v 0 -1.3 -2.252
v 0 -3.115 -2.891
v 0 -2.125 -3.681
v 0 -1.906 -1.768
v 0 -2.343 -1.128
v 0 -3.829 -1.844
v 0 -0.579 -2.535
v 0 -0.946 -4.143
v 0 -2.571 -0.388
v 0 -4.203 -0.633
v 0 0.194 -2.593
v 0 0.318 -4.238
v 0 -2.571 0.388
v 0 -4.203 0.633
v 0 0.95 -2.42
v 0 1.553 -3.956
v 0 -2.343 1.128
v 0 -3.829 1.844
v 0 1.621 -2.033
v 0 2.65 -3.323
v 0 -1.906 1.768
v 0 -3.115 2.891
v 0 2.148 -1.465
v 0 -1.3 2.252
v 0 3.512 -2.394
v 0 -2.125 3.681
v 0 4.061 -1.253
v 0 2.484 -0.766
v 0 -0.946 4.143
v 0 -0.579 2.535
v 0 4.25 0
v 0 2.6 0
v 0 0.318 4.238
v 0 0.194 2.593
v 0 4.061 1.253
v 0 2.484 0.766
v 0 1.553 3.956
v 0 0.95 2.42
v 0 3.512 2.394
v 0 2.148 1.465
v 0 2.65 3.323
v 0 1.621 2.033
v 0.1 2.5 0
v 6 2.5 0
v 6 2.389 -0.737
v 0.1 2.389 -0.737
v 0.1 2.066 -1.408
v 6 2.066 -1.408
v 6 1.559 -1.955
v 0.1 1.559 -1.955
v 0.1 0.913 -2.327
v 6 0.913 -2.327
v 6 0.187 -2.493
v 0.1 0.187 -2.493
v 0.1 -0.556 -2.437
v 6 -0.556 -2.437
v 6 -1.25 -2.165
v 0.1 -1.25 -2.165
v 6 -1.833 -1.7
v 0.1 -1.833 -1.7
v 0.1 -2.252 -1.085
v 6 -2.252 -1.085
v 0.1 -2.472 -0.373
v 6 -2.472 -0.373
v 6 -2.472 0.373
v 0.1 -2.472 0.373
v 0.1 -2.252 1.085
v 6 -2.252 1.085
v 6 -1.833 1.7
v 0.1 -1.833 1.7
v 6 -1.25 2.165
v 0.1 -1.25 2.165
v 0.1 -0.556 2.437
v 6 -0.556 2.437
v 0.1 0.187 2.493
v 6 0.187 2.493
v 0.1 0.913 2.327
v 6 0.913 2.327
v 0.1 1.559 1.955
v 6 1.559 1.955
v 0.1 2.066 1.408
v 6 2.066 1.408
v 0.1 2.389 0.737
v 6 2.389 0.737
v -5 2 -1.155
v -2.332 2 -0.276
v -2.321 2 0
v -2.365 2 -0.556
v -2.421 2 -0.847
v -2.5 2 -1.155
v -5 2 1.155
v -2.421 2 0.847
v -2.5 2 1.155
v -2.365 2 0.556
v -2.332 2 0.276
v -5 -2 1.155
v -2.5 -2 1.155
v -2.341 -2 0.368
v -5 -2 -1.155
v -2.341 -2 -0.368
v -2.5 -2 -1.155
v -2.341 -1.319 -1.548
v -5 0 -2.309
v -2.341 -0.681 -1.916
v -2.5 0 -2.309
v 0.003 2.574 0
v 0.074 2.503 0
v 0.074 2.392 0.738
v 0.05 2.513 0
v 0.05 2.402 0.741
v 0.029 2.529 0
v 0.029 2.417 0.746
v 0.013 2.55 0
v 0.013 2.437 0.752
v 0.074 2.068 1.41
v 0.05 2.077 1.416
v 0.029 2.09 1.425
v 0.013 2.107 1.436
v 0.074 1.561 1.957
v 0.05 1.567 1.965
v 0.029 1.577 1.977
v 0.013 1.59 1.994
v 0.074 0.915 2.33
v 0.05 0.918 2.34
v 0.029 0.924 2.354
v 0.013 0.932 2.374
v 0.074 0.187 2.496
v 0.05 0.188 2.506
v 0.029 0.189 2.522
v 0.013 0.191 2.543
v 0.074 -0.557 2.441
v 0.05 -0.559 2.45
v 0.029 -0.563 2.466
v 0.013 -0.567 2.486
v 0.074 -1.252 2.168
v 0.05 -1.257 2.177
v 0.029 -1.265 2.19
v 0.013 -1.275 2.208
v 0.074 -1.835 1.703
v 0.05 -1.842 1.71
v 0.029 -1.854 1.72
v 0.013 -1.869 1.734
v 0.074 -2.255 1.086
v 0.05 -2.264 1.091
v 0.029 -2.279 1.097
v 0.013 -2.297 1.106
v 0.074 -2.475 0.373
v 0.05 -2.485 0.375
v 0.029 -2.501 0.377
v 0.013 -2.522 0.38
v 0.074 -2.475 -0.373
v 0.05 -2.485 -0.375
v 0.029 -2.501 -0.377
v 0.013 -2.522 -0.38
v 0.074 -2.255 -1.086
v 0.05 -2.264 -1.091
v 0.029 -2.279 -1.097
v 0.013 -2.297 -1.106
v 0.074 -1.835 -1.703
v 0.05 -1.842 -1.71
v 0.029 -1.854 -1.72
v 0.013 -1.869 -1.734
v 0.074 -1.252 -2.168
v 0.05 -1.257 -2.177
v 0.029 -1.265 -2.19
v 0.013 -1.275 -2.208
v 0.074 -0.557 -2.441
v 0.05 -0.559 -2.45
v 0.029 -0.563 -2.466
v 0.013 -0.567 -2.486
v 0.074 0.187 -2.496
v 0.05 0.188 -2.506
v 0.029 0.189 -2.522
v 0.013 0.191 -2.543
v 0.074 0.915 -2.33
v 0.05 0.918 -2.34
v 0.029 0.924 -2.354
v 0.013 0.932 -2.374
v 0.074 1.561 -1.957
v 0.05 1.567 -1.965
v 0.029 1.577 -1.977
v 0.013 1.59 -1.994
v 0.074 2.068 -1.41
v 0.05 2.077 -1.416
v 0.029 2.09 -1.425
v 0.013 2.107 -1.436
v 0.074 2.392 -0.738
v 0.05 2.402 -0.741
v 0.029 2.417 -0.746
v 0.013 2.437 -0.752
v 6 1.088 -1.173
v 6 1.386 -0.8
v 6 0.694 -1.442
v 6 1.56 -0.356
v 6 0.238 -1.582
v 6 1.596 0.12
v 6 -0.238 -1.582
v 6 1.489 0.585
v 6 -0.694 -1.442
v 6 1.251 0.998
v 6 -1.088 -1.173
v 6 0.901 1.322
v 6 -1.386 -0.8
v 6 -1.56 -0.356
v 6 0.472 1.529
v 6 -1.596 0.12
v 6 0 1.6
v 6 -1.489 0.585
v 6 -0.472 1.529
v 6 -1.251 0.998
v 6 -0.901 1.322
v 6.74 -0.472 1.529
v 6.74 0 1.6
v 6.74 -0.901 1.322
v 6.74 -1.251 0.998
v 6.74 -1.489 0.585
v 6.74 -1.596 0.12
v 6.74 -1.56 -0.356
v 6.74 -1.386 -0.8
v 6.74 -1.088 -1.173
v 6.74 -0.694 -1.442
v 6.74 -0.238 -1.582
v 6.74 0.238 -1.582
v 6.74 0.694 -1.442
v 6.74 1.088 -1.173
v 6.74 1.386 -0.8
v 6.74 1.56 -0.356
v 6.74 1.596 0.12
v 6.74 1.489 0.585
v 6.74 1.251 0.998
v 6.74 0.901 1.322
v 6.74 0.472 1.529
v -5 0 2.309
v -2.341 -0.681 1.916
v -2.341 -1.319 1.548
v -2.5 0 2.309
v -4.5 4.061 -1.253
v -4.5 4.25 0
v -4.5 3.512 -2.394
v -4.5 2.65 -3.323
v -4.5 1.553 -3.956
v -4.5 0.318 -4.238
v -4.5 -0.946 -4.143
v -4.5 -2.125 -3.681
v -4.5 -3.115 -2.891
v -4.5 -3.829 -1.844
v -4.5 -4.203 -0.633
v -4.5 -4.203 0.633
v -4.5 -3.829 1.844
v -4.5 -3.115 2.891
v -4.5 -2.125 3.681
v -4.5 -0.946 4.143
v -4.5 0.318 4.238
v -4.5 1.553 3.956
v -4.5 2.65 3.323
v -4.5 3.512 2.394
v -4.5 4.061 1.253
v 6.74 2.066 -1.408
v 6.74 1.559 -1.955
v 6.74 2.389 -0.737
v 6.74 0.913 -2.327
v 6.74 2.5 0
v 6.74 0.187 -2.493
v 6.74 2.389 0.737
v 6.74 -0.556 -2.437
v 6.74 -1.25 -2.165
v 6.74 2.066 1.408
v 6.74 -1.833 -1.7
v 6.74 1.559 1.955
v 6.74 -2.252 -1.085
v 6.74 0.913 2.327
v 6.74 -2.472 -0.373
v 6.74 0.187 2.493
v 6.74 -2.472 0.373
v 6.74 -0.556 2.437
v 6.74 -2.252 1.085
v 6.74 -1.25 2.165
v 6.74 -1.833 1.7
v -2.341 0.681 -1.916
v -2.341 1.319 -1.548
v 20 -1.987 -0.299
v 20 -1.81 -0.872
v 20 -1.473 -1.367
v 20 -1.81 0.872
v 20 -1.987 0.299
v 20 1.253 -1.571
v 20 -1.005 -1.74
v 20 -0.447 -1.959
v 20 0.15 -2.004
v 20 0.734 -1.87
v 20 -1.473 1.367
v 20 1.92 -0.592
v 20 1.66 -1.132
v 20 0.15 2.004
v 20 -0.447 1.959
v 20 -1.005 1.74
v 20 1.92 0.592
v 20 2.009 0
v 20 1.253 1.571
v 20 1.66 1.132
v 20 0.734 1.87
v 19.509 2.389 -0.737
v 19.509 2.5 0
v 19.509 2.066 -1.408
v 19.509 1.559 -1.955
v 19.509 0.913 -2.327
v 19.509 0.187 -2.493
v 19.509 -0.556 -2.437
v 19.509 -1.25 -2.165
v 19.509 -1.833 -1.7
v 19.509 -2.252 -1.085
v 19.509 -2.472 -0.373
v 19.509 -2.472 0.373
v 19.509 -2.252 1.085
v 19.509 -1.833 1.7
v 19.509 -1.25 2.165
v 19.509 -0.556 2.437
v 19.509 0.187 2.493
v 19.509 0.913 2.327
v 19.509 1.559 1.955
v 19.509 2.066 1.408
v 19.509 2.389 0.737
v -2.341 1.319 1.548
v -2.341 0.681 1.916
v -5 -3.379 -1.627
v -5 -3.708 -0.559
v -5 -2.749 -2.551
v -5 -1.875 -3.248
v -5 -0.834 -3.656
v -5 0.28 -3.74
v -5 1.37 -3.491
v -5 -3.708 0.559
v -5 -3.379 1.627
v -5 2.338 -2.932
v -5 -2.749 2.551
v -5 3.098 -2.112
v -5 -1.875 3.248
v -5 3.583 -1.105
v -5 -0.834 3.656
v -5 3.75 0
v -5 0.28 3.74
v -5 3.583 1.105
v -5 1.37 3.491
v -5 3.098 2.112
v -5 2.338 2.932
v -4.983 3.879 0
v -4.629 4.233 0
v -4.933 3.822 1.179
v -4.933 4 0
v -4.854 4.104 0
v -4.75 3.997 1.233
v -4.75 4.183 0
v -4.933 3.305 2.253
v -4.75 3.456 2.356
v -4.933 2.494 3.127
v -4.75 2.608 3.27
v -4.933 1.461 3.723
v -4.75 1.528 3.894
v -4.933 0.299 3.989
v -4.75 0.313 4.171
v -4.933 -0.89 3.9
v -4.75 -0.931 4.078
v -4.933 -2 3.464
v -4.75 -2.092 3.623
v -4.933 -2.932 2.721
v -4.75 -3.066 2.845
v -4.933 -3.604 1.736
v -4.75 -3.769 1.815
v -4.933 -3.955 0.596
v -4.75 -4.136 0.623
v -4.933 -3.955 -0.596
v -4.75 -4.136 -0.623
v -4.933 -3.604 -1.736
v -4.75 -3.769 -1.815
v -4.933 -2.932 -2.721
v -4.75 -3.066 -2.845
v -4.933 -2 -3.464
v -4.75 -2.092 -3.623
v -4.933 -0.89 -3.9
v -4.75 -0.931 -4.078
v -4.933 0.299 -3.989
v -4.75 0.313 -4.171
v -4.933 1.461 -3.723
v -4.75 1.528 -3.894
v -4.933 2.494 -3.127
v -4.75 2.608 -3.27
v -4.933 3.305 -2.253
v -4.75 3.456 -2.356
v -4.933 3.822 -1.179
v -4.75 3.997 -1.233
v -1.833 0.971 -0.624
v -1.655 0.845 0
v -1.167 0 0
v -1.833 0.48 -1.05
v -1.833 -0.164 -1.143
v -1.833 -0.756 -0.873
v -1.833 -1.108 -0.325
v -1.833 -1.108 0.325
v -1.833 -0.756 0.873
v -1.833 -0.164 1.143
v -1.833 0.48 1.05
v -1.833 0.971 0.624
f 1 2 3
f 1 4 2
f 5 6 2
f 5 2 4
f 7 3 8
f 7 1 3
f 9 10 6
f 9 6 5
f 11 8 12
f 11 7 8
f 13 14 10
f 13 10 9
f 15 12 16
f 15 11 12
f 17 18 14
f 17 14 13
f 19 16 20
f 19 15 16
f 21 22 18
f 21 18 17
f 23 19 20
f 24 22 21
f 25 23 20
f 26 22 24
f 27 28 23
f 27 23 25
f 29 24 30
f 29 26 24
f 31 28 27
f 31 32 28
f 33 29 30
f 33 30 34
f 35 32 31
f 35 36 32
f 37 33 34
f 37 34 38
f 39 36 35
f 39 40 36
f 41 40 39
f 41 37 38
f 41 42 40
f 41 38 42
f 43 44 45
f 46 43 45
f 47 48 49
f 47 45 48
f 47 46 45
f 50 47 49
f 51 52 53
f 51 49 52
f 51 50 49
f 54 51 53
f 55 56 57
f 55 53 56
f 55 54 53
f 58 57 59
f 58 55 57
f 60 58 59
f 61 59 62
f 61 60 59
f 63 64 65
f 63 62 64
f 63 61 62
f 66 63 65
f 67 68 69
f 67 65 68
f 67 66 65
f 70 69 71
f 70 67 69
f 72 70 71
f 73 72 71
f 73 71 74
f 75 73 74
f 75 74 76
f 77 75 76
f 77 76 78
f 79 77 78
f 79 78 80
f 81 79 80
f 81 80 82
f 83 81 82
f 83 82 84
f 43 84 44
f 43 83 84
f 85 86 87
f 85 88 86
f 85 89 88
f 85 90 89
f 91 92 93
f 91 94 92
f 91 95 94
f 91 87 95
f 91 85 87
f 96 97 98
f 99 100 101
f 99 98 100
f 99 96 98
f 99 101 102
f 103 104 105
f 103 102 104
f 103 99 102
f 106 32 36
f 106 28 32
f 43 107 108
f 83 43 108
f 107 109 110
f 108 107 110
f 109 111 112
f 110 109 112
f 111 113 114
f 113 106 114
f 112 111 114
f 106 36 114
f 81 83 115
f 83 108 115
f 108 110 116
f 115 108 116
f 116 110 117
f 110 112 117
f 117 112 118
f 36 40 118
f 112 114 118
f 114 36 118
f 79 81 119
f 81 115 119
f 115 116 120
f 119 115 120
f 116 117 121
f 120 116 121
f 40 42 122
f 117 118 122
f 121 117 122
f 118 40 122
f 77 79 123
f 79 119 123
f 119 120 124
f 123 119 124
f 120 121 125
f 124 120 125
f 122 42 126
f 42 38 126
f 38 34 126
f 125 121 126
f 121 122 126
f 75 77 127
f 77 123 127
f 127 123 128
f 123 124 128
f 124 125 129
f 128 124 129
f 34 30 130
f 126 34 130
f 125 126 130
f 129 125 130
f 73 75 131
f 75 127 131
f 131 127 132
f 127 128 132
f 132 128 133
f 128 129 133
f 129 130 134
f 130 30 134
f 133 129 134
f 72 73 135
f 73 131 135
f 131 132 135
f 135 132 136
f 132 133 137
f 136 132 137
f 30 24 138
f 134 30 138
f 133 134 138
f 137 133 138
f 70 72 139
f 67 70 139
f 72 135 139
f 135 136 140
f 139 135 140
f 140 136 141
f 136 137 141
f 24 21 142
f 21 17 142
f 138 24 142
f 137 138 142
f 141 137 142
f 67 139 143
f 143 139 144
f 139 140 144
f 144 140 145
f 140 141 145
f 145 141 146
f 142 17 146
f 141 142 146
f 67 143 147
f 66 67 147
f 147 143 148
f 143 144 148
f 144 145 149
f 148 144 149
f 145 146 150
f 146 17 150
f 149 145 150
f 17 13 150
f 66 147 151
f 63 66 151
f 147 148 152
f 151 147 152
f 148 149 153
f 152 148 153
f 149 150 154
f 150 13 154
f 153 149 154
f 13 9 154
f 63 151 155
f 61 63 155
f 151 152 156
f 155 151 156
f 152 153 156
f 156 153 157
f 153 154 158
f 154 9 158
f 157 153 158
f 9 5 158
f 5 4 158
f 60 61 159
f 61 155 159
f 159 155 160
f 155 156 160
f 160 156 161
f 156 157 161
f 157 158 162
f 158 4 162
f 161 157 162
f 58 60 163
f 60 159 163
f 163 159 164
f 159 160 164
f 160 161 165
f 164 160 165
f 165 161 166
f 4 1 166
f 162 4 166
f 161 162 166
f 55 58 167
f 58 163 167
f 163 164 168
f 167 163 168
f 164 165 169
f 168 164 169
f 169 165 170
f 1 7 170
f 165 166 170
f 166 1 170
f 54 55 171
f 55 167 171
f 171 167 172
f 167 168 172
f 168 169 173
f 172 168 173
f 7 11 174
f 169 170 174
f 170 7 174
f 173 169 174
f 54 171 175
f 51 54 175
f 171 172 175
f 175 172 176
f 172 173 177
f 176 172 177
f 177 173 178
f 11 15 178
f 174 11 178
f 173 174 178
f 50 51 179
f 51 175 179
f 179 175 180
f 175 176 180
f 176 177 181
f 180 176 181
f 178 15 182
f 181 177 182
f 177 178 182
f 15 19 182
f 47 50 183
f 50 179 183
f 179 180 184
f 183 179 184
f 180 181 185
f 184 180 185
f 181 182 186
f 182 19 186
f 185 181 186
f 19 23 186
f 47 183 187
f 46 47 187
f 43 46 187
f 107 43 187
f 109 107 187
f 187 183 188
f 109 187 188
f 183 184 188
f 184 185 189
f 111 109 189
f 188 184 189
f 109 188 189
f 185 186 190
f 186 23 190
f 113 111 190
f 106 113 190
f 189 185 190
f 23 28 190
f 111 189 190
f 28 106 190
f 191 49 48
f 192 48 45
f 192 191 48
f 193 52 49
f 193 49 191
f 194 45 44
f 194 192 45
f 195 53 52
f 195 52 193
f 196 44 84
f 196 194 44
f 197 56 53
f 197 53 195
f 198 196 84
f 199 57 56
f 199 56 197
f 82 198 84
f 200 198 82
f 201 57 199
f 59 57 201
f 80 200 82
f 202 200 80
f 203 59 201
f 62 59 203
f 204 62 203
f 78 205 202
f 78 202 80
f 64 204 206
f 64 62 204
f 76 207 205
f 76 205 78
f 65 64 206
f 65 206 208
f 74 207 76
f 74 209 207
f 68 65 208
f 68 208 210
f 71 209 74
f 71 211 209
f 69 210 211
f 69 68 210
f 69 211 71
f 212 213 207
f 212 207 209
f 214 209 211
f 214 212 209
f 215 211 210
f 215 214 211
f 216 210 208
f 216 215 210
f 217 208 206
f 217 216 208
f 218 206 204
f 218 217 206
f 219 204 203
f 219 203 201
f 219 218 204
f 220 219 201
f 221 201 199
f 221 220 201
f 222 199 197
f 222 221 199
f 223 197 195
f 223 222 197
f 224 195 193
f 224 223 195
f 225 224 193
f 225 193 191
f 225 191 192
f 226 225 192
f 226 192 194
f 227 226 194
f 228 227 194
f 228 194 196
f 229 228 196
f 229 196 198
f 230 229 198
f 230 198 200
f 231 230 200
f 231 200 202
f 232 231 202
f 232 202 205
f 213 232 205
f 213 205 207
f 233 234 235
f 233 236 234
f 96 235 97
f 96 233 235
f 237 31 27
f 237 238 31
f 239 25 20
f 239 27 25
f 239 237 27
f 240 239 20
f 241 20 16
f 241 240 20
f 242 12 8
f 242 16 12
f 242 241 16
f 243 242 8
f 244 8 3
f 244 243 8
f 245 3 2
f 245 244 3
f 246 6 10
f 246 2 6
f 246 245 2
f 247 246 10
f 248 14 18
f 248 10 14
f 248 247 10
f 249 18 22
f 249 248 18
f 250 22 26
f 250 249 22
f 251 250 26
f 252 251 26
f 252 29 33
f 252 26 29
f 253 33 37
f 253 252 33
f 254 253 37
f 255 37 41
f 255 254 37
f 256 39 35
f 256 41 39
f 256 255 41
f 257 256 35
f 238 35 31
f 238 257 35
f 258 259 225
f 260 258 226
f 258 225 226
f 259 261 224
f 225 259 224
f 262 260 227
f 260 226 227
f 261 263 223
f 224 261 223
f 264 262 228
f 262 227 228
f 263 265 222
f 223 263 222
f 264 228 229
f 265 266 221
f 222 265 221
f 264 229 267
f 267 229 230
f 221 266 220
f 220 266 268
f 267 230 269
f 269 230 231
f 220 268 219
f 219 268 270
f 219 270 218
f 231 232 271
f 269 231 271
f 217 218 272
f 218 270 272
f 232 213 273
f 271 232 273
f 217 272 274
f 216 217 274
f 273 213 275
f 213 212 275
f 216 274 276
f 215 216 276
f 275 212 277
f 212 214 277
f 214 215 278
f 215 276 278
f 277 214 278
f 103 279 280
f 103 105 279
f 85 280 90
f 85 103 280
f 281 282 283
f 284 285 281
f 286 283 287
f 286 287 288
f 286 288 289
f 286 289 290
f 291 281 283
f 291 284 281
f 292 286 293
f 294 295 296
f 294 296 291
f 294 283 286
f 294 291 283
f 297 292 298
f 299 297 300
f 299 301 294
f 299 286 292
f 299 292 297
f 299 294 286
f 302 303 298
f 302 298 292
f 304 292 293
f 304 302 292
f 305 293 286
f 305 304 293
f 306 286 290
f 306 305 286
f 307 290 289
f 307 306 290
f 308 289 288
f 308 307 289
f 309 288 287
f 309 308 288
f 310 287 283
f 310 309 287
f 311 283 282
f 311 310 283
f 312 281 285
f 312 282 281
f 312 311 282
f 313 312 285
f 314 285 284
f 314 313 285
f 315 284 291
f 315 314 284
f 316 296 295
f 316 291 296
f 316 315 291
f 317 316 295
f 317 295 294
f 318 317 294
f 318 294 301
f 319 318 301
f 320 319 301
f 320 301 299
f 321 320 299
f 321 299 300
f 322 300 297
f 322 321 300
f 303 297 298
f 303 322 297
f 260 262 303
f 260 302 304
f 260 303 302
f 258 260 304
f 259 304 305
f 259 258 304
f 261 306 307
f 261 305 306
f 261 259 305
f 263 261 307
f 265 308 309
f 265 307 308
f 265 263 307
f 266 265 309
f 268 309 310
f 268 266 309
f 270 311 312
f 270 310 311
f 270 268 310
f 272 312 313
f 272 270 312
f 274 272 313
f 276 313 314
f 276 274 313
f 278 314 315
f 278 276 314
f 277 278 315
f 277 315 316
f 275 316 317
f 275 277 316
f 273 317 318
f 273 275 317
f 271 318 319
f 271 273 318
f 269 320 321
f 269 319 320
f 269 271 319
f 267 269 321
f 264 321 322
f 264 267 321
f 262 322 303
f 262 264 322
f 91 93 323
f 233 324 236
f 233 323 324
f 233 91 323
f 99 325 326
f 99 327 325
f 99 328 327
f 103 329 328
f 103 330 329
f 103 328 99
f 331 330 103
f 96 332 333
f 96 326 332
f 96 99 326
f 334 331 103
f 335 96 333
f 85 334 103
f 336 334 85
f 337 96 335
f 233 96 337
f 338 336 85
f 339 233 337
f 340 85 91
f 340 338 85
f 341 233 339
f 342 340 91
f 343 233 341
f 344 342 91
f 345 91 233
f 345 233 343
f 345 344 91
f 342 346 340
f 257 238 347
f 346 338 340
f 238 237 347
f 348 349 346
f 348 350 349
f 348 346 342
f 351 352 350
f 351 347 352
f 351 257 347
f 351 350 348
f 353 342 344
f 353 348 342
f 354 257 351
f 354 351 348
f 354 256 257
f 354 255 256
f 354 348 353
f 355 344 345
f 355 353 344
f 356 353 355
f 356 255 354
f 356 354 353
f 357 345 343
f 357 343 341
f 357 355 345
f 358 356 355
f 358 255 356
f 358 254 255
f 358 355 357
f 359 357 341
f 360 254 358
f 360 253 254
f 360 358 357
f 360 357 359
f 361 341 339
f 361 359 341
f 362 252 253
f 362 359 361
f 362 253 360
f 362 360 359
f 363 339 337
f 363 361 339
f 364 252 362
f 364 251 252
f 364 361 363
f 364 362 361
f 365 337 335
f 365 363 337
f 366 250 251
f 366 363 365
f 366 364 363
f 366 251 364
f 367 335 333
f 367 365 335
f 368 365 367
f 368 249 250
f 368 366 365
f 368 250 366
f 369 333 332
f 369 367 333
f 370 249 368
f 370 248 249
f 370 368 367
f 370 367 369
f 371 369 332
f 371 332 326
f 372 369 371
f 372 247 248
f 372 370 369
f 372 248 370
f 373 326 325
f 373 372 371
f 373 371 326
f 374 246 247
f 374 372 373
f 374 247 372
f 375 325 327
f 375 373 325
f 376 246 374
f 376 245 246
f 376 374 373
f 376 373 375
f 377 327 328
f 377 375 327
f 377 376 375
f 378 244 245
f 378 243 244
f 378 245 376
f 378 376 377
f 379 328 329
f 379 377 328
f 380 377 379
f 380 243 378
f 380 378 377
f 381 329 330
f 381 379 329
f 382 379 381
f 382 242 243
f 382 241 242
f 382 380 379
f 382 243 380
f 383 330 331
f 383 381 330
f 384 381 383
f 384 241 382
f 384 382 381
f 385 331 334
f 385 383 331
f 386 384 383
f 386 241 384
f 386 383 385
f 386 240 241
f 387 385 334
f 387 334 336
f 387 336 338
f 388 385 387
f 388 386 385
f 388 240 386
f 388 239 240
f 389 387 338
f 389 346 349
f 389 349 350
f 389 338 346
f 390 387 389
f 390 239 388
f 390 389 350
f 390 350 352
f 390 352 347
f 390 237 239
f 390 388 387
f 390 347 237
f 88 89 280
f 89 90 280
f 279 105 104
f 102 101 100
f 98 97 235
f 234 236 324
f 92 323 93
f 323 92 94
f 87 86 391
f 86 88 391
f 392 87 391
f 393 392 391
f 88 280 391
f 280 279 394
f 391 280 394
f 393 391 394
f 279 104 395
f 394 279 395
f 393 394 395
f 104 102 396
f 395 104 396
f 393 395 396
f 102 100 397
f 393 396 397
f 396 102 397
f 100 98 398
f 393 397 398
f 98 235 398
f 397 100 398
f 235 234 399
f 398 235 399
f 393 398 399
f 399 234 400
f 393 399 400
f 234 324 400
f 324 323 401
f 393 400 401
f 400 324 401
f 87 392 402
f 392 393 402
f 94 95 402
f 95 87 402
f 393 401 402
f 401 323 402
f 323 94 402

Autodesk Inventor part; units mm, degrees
ref_plane "YZ Plane" through (0, 0, 0) normal (1, 0, 0) x (0, 1, 0)
ref_plane "XZ Plane" through (0, 0, 0) normal (0, 1, 0) x (-1, 0, 0)
sketch "Skizze1" plane through (0, 0, 0) normal (0, 0, 1) x (1, 0, 0)
  line L0 (-1.1667, 0) -> (20, 0)
  line L1 (20, 0) -> (20, 2.5)
  line L2 (20, 2.5) -> (2, 2.5)
  line L3 (2, 2.5) -> (1.5091, 2.5)
  line L4 (1.5091, 2.5) -> (0, 2.5)
  line L5 (0, 2.5) -> (0, 4.25)
  line L6 (0, 4.25) -> (-5, 4.25)
  line L7 (-5, 4.25) -> (-5, 2.3094)
  line L8 (-5, 2.3094) -> (-2.5, 2.3094)
  line L9 (-2.5, 2.3094) -> (-1.1667, 0)
  line L10 (-10, 0) -> (25, 0) projected
  line L11 (0, -0.85) -> (0, 5.1) projected
  line L12 (2, 2.5) -> (0, 2.5) construction
  dimension "d1" = 18
  dimension "d2" = 0.4909
  dimension "d3" = 5
  dimension "d4" = 2.5
  dimension "d5" = 60
  dimension "d6" = 5
  dimension "d7" = 5
  dimension "d8" = 4.6188
  dimension "d9" = 8.5
  dimension "d26" = 20
revolve "Körper" add sketch "Skizze1" angle 360 about axis through (-1.1667, 0, 0) along (1, 0, 0)
sketch "Skizze2" plane through (-5, 0, 0) normal (-1, 0, 0) x (0, 0, 1)
  circle A0 centre (0, 0) radius 2.3094 projected
  line L0 (0, -5.95) -> (0, 5.95) projected
  line L1 (-5.95, 0) -> (5.95, 0) projected
  line L2 (2.3094, 0) -> (1.1547, -2)
  line L3 (1.1547, -2) -> (-1.1547, -2)
  line L4 (-1.1547, -2) -> (-2.3094, 0)
  line L5 (-2.3094, 0) -> (-1.1547, 2)
  line L6 (-1.1547, 2) -> (1.1547, 2)
  line L7 (1.1547, 2) -> (2.3094, 0)
extrude "Loch" add sketch "Skizze2" against normal up to next contours L7 A0 | A0 L2 | L6 L0 A0 | A0 L0 L3 | L0 L6 A0 | A0 L3 L0 | L4 A0 | A0 L5
fillet "Rundung1" radius 0.5 1 edges at (-5, -4.25, 0)
thread "Gewinde" size "M5x0.8" class "6g" standard "ISO Metric profile" length 18
chamfer "Fase1" distance 0.4908 distance2 0.4908 1 edges at (20, -2.5, 0) measured on face at (20, -0.7379, -0.3873)
ref_plane "Work Plane1" through (29, 0, 0) normal (0, -1, 0) x (1, 0, 0)
fillet "Fillet2" radius 0.1 1 edges at (0, -2.5, 0)
sketch "Skizze4" plane through (0, 0, 0) normal (0, 1, 0) x (-1, 0, 0)
  line L0 (-19.5092, 2.5) -> (-19.5092, -2.5) projected
  line L1 (-0.1, -2.5) -> (-0.1, 2.5) projected
  line L2 (-0.1, 2.5) -> (-19.5092, 2.5) projected
  line L3 (-6.74, 2.5) -> (-6, 2.5)
  line L4 (-6, 2.5) -> (-6, 1.6)
  line L5 (-6, 1.6) -> (-6.74, 1.6)
  line L6 (-6.74, 1.6) -> (-6.74, 2.5)
  line L7 (0, 4.25) -> (0, -4.25) projected
  line L8 (10, 0) -> (-25, 0) projected
  point P0 (0, 0)
  dimension "d31" = 6
  dimension "d32" = 3.2
  dimension "d33" = 0.74
revolve "Umdrehung2" cut sketch "Skizze4" angle 360 about axis through (-10, 0, 0) along (1, 0, 0) contours L2 L4 L5 L6
equation "\"d30\" = R"
equation "\"d17\" = RR"
equation "\"d13\" = GEL"
equation "\"d15\" = -0.5 * SPD + 0.5 * GD"
equation "\"d16\" = GUL"
equation "\"d1\" = GEL"
equation "\"d3\" = KOH"
equation "\"d4\" = INTI"
equation "\"d6\" = GD"
equation "\"d7\" = BDM"
equation "\"d8\" = 1.1547 * SW"
equation "\"d9\" = KOD"
equation "\"d26\" = NLG"
equation "\"GD\" = 5"
equation "\"NLG\" = 20"
equation "\"GEL\" = 18"
equation "\"KOD\" = 8.5"
equation "\"KOH\" = 5"
equation "\"INTI\" = 2.5"
equation "\"GAL\" = 0.61345 * PTC"
equation "\"GUL\" = 0.61345 * PTC"
equation "\"BDM\" = NND"
equation "\"SW\" = 4"
equation "\"RR\" = 0.5"
equation "\"SPD\" = NND - 1.2269 * PTC"
equation "\"R\" = 0.1"
equation "\"TOA\" = 30deg"
equation "\"GD1\" = THREADDIA - 1.2269 * PTC"
equation "\"THREADDIA\" = 5"
equation "\"FAWI\" = 45deg"
equation "\"PTC\" = 0.8"
equation "\"NND\" = 5"
equation "\"E0\" = 1.155 * SW"
properties part number "ISO 4762 - M5 x 20" material "EdelStahl - 440C"
